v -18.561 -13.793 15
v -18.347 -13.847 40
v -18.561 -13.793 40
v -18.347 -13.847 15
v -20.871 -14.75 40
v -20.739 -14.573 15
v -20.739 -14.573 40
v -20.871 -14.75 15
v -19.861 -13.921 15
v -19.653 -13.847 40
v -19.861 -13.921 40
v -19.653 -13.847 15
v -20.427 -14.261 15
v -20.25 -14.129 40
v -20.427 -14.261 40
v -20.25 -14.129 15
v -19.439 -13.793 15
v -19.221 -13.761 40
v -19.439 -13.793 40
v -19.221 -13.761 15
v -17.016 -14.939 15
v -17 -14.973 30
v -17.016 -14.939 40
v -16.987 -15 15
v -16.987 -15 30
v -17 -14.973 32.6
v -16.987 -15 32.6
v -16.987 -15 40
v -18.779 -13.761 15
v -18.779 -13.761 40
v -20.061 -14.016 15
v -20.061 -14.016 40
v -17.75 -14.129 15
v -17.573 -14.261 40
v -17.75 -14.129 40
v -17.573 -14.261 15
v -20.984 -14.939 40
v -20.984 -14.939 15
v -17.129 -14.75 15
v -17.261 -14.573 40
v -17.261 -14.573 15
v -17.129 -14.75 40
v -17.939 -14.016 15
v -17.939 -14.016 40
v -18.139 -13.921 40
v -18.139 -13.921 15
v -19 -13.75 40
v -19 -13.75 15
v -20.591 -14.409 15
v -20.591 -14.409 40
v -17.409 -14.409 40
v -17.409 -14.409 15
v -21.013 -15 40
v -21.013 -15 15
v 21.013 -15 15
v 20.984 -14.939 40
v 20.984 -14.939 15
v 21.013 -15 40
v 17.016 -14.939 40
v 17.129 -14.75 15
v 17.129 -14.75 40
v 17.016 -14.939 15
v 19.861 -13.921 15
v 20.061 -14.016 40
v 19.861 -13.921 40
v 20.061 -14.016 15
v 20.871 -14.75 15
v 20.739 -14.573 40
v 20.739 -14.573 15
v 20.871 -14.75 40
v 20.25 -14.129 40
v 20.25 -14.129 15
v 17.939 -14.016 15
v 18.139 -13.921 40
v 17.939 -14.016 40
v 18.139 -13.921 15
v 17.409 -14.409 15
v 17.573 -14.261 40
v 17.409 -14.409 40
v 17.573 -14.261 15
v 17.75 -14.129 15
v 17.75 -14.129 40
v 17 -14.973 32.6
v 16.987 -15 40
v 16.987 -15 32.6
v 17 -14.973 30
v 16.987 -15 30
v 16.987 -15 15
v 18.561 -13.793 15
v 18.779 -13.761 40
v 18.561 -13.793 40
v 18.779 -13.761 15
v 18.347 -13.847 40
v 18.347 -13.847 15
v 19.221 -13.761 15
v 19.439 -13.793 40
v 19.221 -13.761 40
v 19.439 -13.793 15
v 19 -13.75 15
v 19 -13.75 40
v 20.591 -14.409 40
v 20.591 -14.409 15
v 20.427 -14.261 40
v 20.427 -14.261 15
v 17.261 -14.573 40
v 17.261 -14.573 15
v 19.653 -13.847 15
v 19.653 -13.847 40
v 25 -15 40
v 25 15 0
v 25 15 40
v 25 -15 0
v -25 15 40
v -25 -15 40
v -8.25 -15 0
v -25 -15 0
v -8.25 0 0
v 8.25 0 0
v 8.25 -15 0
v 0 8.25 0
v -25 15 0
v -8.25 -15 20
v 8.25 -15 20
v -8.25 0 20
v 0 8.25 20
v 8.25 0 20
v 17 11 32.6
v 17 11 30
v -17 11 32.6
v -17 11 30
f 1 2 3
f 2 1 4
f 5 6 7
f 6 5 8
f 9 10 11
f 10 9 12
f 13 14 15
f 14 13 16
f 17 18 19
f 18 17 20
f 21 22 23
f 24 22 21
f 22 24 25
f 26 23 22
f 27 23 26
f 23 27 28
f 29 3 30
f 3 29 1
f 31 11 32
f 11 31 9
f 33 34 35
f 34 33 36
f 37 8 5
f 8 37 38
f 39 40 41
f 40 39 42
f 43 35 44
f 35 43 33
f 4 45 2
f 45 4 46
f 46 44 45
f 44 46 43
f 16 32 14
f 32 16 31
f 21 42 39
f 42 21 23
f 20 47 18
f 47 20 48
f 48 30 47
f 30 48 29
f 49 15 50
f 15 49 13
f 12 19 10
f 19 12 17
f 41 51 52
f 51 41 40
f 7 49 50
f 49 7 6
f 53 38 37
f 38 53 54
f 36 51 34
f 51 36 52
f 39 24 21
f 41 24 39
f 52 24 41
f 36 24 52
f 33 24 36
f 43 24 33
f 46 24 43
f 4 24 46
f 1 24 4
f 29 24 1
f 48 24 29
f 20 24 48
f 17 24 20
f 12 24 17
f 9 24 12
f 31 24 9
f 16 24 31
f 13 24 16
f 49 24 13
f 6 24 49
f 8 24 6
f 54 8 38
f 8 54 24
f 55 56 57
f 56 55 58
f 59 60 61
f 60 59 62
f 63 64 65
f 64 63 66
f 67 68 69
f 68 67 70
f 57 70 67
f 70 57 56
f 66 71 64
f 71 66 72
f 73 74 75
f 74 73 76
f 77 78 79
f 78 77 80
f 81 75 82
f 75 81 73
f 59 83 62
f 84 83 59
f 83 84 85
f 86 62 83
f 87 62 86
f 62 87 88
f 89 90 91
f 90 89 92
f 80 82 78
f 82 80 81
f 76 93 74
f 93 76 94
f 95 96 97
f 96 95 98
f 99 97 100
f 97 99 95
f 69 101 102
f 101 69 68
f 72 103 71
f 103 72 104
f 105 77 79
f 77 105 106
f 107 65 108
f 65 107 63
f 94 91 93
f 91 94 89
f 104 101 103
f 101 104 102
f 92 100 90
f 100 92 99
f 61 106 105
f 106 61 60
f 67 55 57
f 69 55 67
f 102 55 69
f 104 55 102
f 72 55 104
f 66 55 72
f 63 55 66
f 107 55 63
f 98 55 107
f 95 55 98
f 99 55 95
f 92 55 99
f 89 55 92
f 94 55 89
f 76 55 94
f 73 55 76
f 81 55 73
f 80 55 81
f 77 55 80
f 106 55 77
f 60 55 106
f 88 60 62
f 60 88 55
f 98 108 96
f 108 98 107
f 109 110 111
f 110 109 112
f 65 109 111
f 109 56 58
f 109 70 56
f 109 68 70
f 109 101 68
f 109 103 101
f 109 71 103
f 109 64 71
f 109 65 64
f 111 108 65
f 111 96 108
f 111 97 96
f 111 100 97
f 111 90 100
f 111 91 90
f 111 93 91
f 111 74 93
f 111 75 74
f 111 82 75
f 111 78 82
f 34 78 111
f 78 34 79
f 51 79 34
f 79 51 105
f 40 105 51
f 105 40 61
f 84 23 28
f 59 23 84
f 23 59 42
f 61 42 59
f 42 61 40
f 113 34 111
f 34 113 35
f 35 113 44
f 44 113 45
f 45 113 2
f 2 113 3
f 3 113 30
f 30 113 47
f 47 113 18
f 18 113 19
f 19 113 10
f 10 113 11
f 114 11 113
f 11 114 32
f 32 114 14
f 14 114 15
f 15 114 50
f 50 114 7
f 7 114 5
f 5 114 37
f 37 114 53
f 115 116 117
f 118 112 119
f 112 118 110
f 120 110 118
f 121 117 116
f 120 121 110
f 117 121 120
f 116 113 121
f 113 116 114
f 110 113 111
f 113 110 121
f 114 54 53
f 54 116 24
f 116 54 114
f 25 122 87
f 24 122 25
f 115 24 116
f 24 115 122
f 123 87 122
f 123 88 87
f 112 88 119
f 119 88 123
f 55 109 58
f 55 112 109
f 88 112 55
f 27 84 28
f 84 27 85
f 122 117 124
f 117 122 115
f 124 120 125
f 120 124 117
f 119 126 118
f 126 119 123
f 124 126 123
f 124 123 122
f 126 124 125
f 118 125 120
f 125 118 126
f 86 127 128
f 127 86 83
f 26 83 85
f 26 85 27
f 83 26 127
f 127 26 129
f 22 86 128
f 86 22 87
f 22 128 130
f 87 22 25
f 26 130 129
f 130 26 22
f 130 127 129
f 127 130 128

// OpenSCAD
// Wall-mounted 10 mL syringe holder (tip-down, upright)
// Print orientation: rests on XY plane at z = 0, builds +Z, centred in X/Y.
// Back face (y = 15) is the wall side; syringe slides in from the front (y = -15).

// ---- Block dimensions (measured with calipers) ----
block_w = 50;   // X width
block_d = 30;   // Y depth
block_h = 40;   // Z height

// ---- Barrel channel (16.5 mm wide vertical slot, full height) ----
ch_half_w = 16.5 / 2;   // 8.25 mm half-width
ch_back_r = 8.25;       // radius of the half-circle at the back end
ch_back_cy = 0;         // centre of the back half-circle in Y (y = 0)
ch_front_y = -15;       // straight sides run forward to the front face

// ---- Finger-flange slot (cut in from the front face) ----
flange_w = 34;          // X width, centred
flange_h = 2.6;         // Z thickness (2 mm flange + clearance)
flange_z0 = 30;         // bottom of slot
flange_z1 = 32.6;       // top of slot
flange_y0 = -15;        // starts at the front face
flange_y1 = 11;         // extends back to y = 11

// ---- M4 wall-screw clearance holes (through, along Y) ----
screw_d = 4.5;          // clearance hole diameter
screw_z = 15;           // hole centre height
screw_x = [-19, 19];    // hole centre X positions

// ---- Curvature resolution ----
$fn = 64;

// =====================================================================
// 1. Base block, centred on origin in X and Y, sitting on z = 0
// =====================================================================
module block() { translate([-block_w / 2, -block_d / 2, 0])
    cube([block_w, block_d, block_h]); }

// =====================================================================
// 2. Barrel channel: ONE extruded "D" profile (half-circle at the back +
//    rectangle forward to the front face). A single solid avoids the
//    fragile shared boundary that made the previous union fail to cut.
//    The profile is built in the XY plane and extruded along Z, so the
//    channel runs the full height; it extends 1 mm past the top/bottom
//    faces so the cut is clean and no faces end up exactly coplanar.
// =====================================================================
module barrel_channel() {
    translate([0, ch_back_cy, -1])
        linear_extrude(height = block_h + 2, center = true)
            polygon(points = [
                [ ch_half_w, 0],                       // right side, at back centre
                [ ch_half_w, ch_front_y - ch_back_cy], // right side, at front face
                [-ch_half_w, ch_front_y - ch_back_cy], // left side,  at front face
                [-ch_half_w, 0],                       // left side,  at back centre
                [ 0, ch_back_r]                        // apex of the back half-circle
            ]);
}

// =====================================================================
// 3. Finger-flange slot: 34 mm wide, 2.6 mm tall, y = -15 .. 11
//    (extends 1 mm past the front face so the cut is not coplanar)
// =====================================================================
module flange_slot() { translate([-flange_w / 2, flange_y0 - 1, flange_z0])
    cube([flange_w, flange_y1 - flange_y0 + 1, flange_h]); }

// =====================================================================
// 4. M4 screw clearance holes: 4.5 mm dia, through along Y
//    (extend 1 mm past both the front and back faces)
// =====================================================================
module screw_holes() { for (sx = screw_x)
    translate([sx, -block_d / 2 - 1, screw_z])
        cylinder(h = block_d + 2, r = screw_d / 2, $fn = 64); }

// =====================================================================
// Final part: block minus all cutters
// =====================================================================
difference() {
    block();
    barrel_channel();
    flange_slot();
    screw_holes();
}
